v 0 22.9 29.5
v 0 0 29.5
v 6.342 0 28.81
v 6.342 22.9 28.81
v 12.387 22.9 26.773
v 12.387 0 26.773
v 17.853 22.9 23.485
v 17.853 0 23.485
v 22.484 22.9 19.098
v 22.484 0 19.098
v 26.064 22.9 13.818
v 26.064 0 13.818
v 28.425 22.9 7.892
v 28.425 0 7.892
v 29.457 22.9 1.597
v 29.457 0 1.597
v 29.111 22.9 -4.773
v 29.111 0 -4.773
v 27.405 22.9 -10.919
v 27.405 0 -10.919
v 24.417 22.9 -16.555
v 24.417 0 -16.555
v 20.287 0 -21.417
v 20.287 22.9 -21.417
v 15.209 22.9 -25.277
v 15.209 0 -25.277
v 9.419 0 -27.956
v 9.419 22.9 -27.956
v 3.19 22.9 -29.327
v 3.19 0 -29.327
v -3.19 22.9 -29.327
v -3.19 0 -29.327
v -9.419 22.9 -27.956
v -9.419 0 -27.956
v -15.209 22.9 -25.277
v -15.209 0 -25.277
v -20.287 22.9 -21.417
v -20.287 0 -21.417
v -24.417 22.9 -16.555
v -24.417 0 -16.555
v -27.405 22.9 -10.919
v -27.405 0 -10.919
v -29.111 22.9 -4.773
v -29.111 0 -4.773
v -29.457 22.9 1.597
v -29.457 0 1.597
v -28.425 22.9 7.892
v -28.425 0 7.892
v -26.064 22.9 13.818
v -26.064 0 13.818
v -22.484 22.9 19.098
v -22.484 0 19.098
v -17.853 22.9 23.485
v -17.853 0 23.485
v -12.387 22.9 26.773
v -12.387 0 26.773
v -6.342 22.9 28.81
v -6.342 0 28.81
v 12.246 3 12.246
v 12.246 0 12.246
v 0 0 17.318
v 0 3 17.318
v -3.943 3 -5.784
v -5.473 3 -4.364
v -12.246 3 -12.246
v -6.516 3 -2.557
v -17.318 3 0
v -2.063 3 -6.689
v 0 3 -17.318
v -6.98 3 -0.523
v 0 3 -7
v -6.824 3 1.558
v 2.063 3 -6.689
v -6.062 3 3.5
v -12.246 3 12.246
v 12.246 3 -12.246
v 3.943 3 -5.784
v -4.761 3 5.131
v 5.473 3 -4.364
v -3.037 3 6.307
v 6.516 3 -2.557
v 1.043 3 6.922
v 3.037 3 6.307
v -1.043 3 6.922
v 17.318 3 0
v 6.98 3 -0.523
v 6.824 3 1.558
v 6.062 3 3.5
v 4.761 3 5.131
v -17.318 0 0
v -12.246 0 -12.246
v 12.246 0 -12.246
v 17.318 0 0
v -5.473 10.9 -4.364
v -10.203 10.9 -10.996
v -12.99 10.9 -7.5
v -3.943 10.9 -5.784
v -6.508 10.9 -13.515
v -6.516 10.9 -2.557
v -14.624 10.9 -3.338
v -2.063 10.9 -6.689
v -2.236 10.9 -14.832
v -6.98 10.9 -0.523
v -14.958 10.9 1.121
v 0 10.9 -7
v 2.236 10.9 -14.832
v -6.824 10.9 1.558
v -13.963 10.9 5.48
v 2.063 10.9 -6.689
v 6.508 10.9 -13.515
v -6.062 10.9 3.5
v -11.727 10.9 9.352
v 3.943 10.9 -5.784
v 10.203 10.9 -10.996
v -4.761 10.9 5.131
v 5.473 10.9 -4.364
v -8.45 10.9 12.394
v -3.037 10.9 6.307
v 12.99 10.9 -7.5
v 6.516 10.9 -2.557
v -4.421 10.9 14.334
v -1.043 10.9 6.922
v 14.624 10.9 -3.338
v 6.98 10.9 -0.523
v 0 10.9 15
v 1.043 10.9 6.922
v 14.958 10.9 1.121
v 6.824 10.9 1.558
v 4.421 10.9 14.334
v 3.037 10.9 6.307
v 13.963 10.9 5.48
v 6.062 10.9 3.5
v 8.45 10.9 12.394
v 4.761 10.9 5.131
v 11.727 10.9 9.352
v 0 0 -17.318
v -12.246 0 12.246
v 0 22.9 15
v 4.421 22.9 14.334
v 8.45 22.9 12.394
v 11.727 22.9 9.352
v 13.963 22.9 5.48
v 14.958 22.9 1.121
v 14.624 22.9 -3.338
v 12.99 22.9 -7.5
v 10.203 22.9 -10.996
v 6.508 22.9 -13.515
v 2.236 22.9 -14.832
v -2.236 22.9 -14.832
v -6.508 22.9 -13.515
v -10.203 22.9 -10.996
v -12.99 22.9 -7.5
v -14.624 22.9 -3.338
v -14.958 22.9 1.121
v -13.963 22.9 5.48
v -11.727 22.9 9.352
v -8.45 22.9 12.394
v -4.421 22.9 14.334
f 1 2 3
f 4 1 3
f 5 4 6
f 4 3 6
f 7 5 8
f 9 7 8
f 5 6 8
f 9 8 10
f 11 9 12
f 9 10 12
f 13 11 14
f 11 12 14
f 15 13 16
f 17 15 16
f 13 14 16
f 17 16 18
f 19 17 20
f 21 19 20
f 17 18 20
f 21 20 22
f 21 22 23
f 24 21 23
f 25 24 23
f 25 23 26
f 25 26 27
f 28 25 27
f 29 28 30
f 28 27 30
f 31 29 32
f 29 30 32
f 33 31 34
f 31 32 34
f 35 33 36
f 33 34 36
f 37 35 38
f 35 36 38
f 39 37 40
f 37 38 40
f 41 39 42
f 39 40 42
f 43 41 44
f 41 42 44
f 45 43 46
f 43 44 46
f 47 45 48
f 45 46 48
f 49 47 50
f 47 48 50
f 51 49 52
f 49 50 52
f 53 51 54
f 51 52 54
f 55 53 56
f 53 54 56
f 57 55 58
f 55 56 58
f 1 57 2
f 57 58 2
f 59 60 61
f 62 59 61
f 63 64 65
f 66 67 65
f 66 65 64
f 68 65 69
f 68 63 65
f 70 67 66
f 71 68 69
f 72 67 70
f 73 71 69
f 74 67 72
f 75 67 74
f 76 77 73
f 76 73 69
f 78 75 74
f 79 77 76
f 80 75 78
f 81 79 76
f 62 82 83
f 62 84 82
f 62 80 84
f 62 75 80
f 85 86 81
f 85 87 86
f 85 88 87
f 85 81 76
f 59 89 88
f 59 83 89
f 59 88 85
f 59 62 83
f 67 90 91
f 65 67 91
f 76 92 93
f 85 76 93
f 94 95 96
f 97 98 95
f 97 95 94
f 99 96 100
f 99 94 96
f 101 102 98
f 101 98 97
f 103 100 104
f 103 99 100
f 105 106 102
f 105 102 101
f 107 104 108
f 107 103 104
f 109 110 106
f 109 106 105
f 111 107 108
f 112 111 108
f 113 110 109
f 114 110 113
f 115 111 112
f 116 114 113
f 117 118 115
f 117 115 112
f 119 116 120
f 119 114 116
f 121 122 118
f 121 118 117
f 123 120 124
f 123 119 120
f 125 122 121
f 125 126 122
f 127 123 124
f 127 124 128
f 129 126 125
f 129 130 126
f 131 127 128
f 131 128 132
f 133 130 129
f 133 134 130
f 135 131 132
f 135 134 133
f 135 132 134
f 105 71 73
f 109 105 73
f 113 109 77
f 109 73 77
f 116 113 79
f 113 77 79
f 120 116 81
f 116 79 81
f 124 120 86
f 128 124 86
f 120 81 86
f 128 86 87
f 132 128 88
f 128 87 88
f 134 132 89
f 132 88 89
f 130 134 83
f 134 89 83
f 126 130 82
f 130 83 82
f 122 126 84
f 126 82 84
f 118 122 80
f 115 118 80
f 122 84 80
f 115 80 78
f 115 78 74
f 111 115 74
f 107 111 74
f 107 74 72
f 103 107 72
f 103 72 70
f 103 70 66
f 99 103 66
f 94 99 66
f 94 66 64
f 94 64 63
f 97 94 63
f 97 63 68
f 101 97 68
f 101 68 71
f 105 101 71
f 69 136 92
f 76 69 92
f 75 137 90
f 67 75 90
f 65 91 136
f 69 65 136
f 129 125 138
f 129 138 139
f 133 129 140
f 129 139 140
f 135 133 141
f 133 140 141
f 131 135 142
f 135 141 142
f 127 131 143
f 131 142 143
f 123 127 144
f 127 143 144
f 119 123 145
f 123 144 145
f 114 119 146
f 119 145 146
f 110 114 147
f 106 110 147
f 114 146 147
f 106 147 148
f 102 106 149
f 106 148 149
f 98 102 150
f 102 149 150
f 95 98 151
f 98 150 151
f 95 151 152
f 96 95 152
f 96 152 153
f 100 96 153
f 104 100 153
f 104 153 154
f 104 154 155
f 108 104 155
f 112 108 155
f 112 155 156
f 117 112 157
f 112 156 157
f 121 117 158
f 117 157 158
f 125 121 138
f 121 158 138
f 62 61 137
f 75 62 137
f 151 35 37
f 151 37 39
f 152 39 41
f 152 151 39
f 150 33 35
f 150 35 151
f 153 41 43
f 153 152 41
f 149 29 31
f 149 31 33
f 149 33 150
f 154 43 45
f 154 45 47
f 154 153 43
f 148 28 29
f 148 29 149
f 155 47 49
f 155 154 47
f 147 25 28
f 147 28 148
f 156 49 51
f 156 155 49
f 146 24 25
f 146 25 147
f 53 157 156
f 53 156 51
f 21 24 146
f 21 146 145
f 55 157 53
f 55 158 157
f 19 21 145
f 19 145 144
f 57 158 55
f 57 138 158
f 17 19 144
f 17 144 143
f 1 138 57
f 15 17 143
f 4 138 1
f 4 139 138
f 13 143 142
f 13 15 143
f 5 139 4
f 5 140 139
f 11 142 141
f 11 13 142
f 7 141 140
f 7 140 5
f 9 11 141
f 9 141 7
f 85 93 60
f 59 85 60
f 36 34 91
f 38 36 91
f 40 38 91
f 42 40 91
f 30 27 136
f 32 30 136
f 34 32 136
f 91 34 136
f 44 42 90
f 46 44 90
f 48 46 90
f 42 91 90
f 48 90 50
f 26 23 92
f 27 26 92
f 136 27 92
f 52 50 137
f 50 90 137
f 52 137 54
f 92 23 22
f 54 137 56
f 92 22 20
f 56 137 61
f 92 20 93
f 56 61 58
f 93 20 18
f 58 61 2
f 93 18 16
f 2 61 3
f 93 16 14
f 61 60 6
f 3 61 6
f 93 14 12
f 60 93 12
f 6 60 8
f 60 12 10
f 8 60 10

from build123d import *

# Parameters (mm, degrees)
SKETCH1_R           = 29.5
BOSS_EXTRUDE1_DEPTH = 22.9
CUT_EXTRUDE1_DEPTH  = 3
SKETCH3_R           = 7
CUT_EXTRUDE2_DEPTH  = 8
SKETCH4_R           = 15
CUT_EXTRUDE3_DEPTH  = 12


with BuildPart() as part:
    # Sketch1 → Boss-Extrude1 (new body)
    with BuildSketch(Plane(origin=(0, 0, 0), x_dir=(1, 0, 0), z_dir=(0, 1, 0))):
        with Locations(Location((0, 0, 0), (0, 0, 270))):
            Circle(SKETCH1_R)
    extrude(amount=BOSS_EXTRUDE1_DEPTH)

    # Sketch2 → Cut-Extrude1 (cut)
    with BuildSketch(Plane.XZ):
        Polygon((12.245869836, 12.245869836), (0, 17.318275205), (-12.245869836, 12.245869836), (-17.318275205, 0), (-12.245869836, -12.245869836), (0, -17.318275205), (12.245869836, -12.245869836), (17.318275205, 0), align=None)
    extrude(amount=-CUT_EXTRUDE1_DEPTH, mode=Mode.SUBTRACT)

    # Sketch3 → Cut-Extrude2 (cut)
    with BuildSketch(Plane.XZ.offset(-3)):
        with Locations(Location((0, 0, 0), (0, 0, 270))):
            Circle(SKETCH3_R)
    extrude(amount=-CUT_EXTRUDE2_DEPTH, mode=Mode.SUBTRACT)

    # Sketch4 → Cut-Extrude3 (cut)
    with BuildSketch(Plane(origin=(0, 22.9, 0), x_dir=(1, 0, 0), z_dir=(0, 1, 0))):
        with Locations(Location((0, 0, 0), (0, 0, 270))):
            Circle(SKETCH4_R)
    extrude(amount=-CUT_EXTRUDE3_DEPTH, mode=Mode.SUBTRACT)


solid = part.part
